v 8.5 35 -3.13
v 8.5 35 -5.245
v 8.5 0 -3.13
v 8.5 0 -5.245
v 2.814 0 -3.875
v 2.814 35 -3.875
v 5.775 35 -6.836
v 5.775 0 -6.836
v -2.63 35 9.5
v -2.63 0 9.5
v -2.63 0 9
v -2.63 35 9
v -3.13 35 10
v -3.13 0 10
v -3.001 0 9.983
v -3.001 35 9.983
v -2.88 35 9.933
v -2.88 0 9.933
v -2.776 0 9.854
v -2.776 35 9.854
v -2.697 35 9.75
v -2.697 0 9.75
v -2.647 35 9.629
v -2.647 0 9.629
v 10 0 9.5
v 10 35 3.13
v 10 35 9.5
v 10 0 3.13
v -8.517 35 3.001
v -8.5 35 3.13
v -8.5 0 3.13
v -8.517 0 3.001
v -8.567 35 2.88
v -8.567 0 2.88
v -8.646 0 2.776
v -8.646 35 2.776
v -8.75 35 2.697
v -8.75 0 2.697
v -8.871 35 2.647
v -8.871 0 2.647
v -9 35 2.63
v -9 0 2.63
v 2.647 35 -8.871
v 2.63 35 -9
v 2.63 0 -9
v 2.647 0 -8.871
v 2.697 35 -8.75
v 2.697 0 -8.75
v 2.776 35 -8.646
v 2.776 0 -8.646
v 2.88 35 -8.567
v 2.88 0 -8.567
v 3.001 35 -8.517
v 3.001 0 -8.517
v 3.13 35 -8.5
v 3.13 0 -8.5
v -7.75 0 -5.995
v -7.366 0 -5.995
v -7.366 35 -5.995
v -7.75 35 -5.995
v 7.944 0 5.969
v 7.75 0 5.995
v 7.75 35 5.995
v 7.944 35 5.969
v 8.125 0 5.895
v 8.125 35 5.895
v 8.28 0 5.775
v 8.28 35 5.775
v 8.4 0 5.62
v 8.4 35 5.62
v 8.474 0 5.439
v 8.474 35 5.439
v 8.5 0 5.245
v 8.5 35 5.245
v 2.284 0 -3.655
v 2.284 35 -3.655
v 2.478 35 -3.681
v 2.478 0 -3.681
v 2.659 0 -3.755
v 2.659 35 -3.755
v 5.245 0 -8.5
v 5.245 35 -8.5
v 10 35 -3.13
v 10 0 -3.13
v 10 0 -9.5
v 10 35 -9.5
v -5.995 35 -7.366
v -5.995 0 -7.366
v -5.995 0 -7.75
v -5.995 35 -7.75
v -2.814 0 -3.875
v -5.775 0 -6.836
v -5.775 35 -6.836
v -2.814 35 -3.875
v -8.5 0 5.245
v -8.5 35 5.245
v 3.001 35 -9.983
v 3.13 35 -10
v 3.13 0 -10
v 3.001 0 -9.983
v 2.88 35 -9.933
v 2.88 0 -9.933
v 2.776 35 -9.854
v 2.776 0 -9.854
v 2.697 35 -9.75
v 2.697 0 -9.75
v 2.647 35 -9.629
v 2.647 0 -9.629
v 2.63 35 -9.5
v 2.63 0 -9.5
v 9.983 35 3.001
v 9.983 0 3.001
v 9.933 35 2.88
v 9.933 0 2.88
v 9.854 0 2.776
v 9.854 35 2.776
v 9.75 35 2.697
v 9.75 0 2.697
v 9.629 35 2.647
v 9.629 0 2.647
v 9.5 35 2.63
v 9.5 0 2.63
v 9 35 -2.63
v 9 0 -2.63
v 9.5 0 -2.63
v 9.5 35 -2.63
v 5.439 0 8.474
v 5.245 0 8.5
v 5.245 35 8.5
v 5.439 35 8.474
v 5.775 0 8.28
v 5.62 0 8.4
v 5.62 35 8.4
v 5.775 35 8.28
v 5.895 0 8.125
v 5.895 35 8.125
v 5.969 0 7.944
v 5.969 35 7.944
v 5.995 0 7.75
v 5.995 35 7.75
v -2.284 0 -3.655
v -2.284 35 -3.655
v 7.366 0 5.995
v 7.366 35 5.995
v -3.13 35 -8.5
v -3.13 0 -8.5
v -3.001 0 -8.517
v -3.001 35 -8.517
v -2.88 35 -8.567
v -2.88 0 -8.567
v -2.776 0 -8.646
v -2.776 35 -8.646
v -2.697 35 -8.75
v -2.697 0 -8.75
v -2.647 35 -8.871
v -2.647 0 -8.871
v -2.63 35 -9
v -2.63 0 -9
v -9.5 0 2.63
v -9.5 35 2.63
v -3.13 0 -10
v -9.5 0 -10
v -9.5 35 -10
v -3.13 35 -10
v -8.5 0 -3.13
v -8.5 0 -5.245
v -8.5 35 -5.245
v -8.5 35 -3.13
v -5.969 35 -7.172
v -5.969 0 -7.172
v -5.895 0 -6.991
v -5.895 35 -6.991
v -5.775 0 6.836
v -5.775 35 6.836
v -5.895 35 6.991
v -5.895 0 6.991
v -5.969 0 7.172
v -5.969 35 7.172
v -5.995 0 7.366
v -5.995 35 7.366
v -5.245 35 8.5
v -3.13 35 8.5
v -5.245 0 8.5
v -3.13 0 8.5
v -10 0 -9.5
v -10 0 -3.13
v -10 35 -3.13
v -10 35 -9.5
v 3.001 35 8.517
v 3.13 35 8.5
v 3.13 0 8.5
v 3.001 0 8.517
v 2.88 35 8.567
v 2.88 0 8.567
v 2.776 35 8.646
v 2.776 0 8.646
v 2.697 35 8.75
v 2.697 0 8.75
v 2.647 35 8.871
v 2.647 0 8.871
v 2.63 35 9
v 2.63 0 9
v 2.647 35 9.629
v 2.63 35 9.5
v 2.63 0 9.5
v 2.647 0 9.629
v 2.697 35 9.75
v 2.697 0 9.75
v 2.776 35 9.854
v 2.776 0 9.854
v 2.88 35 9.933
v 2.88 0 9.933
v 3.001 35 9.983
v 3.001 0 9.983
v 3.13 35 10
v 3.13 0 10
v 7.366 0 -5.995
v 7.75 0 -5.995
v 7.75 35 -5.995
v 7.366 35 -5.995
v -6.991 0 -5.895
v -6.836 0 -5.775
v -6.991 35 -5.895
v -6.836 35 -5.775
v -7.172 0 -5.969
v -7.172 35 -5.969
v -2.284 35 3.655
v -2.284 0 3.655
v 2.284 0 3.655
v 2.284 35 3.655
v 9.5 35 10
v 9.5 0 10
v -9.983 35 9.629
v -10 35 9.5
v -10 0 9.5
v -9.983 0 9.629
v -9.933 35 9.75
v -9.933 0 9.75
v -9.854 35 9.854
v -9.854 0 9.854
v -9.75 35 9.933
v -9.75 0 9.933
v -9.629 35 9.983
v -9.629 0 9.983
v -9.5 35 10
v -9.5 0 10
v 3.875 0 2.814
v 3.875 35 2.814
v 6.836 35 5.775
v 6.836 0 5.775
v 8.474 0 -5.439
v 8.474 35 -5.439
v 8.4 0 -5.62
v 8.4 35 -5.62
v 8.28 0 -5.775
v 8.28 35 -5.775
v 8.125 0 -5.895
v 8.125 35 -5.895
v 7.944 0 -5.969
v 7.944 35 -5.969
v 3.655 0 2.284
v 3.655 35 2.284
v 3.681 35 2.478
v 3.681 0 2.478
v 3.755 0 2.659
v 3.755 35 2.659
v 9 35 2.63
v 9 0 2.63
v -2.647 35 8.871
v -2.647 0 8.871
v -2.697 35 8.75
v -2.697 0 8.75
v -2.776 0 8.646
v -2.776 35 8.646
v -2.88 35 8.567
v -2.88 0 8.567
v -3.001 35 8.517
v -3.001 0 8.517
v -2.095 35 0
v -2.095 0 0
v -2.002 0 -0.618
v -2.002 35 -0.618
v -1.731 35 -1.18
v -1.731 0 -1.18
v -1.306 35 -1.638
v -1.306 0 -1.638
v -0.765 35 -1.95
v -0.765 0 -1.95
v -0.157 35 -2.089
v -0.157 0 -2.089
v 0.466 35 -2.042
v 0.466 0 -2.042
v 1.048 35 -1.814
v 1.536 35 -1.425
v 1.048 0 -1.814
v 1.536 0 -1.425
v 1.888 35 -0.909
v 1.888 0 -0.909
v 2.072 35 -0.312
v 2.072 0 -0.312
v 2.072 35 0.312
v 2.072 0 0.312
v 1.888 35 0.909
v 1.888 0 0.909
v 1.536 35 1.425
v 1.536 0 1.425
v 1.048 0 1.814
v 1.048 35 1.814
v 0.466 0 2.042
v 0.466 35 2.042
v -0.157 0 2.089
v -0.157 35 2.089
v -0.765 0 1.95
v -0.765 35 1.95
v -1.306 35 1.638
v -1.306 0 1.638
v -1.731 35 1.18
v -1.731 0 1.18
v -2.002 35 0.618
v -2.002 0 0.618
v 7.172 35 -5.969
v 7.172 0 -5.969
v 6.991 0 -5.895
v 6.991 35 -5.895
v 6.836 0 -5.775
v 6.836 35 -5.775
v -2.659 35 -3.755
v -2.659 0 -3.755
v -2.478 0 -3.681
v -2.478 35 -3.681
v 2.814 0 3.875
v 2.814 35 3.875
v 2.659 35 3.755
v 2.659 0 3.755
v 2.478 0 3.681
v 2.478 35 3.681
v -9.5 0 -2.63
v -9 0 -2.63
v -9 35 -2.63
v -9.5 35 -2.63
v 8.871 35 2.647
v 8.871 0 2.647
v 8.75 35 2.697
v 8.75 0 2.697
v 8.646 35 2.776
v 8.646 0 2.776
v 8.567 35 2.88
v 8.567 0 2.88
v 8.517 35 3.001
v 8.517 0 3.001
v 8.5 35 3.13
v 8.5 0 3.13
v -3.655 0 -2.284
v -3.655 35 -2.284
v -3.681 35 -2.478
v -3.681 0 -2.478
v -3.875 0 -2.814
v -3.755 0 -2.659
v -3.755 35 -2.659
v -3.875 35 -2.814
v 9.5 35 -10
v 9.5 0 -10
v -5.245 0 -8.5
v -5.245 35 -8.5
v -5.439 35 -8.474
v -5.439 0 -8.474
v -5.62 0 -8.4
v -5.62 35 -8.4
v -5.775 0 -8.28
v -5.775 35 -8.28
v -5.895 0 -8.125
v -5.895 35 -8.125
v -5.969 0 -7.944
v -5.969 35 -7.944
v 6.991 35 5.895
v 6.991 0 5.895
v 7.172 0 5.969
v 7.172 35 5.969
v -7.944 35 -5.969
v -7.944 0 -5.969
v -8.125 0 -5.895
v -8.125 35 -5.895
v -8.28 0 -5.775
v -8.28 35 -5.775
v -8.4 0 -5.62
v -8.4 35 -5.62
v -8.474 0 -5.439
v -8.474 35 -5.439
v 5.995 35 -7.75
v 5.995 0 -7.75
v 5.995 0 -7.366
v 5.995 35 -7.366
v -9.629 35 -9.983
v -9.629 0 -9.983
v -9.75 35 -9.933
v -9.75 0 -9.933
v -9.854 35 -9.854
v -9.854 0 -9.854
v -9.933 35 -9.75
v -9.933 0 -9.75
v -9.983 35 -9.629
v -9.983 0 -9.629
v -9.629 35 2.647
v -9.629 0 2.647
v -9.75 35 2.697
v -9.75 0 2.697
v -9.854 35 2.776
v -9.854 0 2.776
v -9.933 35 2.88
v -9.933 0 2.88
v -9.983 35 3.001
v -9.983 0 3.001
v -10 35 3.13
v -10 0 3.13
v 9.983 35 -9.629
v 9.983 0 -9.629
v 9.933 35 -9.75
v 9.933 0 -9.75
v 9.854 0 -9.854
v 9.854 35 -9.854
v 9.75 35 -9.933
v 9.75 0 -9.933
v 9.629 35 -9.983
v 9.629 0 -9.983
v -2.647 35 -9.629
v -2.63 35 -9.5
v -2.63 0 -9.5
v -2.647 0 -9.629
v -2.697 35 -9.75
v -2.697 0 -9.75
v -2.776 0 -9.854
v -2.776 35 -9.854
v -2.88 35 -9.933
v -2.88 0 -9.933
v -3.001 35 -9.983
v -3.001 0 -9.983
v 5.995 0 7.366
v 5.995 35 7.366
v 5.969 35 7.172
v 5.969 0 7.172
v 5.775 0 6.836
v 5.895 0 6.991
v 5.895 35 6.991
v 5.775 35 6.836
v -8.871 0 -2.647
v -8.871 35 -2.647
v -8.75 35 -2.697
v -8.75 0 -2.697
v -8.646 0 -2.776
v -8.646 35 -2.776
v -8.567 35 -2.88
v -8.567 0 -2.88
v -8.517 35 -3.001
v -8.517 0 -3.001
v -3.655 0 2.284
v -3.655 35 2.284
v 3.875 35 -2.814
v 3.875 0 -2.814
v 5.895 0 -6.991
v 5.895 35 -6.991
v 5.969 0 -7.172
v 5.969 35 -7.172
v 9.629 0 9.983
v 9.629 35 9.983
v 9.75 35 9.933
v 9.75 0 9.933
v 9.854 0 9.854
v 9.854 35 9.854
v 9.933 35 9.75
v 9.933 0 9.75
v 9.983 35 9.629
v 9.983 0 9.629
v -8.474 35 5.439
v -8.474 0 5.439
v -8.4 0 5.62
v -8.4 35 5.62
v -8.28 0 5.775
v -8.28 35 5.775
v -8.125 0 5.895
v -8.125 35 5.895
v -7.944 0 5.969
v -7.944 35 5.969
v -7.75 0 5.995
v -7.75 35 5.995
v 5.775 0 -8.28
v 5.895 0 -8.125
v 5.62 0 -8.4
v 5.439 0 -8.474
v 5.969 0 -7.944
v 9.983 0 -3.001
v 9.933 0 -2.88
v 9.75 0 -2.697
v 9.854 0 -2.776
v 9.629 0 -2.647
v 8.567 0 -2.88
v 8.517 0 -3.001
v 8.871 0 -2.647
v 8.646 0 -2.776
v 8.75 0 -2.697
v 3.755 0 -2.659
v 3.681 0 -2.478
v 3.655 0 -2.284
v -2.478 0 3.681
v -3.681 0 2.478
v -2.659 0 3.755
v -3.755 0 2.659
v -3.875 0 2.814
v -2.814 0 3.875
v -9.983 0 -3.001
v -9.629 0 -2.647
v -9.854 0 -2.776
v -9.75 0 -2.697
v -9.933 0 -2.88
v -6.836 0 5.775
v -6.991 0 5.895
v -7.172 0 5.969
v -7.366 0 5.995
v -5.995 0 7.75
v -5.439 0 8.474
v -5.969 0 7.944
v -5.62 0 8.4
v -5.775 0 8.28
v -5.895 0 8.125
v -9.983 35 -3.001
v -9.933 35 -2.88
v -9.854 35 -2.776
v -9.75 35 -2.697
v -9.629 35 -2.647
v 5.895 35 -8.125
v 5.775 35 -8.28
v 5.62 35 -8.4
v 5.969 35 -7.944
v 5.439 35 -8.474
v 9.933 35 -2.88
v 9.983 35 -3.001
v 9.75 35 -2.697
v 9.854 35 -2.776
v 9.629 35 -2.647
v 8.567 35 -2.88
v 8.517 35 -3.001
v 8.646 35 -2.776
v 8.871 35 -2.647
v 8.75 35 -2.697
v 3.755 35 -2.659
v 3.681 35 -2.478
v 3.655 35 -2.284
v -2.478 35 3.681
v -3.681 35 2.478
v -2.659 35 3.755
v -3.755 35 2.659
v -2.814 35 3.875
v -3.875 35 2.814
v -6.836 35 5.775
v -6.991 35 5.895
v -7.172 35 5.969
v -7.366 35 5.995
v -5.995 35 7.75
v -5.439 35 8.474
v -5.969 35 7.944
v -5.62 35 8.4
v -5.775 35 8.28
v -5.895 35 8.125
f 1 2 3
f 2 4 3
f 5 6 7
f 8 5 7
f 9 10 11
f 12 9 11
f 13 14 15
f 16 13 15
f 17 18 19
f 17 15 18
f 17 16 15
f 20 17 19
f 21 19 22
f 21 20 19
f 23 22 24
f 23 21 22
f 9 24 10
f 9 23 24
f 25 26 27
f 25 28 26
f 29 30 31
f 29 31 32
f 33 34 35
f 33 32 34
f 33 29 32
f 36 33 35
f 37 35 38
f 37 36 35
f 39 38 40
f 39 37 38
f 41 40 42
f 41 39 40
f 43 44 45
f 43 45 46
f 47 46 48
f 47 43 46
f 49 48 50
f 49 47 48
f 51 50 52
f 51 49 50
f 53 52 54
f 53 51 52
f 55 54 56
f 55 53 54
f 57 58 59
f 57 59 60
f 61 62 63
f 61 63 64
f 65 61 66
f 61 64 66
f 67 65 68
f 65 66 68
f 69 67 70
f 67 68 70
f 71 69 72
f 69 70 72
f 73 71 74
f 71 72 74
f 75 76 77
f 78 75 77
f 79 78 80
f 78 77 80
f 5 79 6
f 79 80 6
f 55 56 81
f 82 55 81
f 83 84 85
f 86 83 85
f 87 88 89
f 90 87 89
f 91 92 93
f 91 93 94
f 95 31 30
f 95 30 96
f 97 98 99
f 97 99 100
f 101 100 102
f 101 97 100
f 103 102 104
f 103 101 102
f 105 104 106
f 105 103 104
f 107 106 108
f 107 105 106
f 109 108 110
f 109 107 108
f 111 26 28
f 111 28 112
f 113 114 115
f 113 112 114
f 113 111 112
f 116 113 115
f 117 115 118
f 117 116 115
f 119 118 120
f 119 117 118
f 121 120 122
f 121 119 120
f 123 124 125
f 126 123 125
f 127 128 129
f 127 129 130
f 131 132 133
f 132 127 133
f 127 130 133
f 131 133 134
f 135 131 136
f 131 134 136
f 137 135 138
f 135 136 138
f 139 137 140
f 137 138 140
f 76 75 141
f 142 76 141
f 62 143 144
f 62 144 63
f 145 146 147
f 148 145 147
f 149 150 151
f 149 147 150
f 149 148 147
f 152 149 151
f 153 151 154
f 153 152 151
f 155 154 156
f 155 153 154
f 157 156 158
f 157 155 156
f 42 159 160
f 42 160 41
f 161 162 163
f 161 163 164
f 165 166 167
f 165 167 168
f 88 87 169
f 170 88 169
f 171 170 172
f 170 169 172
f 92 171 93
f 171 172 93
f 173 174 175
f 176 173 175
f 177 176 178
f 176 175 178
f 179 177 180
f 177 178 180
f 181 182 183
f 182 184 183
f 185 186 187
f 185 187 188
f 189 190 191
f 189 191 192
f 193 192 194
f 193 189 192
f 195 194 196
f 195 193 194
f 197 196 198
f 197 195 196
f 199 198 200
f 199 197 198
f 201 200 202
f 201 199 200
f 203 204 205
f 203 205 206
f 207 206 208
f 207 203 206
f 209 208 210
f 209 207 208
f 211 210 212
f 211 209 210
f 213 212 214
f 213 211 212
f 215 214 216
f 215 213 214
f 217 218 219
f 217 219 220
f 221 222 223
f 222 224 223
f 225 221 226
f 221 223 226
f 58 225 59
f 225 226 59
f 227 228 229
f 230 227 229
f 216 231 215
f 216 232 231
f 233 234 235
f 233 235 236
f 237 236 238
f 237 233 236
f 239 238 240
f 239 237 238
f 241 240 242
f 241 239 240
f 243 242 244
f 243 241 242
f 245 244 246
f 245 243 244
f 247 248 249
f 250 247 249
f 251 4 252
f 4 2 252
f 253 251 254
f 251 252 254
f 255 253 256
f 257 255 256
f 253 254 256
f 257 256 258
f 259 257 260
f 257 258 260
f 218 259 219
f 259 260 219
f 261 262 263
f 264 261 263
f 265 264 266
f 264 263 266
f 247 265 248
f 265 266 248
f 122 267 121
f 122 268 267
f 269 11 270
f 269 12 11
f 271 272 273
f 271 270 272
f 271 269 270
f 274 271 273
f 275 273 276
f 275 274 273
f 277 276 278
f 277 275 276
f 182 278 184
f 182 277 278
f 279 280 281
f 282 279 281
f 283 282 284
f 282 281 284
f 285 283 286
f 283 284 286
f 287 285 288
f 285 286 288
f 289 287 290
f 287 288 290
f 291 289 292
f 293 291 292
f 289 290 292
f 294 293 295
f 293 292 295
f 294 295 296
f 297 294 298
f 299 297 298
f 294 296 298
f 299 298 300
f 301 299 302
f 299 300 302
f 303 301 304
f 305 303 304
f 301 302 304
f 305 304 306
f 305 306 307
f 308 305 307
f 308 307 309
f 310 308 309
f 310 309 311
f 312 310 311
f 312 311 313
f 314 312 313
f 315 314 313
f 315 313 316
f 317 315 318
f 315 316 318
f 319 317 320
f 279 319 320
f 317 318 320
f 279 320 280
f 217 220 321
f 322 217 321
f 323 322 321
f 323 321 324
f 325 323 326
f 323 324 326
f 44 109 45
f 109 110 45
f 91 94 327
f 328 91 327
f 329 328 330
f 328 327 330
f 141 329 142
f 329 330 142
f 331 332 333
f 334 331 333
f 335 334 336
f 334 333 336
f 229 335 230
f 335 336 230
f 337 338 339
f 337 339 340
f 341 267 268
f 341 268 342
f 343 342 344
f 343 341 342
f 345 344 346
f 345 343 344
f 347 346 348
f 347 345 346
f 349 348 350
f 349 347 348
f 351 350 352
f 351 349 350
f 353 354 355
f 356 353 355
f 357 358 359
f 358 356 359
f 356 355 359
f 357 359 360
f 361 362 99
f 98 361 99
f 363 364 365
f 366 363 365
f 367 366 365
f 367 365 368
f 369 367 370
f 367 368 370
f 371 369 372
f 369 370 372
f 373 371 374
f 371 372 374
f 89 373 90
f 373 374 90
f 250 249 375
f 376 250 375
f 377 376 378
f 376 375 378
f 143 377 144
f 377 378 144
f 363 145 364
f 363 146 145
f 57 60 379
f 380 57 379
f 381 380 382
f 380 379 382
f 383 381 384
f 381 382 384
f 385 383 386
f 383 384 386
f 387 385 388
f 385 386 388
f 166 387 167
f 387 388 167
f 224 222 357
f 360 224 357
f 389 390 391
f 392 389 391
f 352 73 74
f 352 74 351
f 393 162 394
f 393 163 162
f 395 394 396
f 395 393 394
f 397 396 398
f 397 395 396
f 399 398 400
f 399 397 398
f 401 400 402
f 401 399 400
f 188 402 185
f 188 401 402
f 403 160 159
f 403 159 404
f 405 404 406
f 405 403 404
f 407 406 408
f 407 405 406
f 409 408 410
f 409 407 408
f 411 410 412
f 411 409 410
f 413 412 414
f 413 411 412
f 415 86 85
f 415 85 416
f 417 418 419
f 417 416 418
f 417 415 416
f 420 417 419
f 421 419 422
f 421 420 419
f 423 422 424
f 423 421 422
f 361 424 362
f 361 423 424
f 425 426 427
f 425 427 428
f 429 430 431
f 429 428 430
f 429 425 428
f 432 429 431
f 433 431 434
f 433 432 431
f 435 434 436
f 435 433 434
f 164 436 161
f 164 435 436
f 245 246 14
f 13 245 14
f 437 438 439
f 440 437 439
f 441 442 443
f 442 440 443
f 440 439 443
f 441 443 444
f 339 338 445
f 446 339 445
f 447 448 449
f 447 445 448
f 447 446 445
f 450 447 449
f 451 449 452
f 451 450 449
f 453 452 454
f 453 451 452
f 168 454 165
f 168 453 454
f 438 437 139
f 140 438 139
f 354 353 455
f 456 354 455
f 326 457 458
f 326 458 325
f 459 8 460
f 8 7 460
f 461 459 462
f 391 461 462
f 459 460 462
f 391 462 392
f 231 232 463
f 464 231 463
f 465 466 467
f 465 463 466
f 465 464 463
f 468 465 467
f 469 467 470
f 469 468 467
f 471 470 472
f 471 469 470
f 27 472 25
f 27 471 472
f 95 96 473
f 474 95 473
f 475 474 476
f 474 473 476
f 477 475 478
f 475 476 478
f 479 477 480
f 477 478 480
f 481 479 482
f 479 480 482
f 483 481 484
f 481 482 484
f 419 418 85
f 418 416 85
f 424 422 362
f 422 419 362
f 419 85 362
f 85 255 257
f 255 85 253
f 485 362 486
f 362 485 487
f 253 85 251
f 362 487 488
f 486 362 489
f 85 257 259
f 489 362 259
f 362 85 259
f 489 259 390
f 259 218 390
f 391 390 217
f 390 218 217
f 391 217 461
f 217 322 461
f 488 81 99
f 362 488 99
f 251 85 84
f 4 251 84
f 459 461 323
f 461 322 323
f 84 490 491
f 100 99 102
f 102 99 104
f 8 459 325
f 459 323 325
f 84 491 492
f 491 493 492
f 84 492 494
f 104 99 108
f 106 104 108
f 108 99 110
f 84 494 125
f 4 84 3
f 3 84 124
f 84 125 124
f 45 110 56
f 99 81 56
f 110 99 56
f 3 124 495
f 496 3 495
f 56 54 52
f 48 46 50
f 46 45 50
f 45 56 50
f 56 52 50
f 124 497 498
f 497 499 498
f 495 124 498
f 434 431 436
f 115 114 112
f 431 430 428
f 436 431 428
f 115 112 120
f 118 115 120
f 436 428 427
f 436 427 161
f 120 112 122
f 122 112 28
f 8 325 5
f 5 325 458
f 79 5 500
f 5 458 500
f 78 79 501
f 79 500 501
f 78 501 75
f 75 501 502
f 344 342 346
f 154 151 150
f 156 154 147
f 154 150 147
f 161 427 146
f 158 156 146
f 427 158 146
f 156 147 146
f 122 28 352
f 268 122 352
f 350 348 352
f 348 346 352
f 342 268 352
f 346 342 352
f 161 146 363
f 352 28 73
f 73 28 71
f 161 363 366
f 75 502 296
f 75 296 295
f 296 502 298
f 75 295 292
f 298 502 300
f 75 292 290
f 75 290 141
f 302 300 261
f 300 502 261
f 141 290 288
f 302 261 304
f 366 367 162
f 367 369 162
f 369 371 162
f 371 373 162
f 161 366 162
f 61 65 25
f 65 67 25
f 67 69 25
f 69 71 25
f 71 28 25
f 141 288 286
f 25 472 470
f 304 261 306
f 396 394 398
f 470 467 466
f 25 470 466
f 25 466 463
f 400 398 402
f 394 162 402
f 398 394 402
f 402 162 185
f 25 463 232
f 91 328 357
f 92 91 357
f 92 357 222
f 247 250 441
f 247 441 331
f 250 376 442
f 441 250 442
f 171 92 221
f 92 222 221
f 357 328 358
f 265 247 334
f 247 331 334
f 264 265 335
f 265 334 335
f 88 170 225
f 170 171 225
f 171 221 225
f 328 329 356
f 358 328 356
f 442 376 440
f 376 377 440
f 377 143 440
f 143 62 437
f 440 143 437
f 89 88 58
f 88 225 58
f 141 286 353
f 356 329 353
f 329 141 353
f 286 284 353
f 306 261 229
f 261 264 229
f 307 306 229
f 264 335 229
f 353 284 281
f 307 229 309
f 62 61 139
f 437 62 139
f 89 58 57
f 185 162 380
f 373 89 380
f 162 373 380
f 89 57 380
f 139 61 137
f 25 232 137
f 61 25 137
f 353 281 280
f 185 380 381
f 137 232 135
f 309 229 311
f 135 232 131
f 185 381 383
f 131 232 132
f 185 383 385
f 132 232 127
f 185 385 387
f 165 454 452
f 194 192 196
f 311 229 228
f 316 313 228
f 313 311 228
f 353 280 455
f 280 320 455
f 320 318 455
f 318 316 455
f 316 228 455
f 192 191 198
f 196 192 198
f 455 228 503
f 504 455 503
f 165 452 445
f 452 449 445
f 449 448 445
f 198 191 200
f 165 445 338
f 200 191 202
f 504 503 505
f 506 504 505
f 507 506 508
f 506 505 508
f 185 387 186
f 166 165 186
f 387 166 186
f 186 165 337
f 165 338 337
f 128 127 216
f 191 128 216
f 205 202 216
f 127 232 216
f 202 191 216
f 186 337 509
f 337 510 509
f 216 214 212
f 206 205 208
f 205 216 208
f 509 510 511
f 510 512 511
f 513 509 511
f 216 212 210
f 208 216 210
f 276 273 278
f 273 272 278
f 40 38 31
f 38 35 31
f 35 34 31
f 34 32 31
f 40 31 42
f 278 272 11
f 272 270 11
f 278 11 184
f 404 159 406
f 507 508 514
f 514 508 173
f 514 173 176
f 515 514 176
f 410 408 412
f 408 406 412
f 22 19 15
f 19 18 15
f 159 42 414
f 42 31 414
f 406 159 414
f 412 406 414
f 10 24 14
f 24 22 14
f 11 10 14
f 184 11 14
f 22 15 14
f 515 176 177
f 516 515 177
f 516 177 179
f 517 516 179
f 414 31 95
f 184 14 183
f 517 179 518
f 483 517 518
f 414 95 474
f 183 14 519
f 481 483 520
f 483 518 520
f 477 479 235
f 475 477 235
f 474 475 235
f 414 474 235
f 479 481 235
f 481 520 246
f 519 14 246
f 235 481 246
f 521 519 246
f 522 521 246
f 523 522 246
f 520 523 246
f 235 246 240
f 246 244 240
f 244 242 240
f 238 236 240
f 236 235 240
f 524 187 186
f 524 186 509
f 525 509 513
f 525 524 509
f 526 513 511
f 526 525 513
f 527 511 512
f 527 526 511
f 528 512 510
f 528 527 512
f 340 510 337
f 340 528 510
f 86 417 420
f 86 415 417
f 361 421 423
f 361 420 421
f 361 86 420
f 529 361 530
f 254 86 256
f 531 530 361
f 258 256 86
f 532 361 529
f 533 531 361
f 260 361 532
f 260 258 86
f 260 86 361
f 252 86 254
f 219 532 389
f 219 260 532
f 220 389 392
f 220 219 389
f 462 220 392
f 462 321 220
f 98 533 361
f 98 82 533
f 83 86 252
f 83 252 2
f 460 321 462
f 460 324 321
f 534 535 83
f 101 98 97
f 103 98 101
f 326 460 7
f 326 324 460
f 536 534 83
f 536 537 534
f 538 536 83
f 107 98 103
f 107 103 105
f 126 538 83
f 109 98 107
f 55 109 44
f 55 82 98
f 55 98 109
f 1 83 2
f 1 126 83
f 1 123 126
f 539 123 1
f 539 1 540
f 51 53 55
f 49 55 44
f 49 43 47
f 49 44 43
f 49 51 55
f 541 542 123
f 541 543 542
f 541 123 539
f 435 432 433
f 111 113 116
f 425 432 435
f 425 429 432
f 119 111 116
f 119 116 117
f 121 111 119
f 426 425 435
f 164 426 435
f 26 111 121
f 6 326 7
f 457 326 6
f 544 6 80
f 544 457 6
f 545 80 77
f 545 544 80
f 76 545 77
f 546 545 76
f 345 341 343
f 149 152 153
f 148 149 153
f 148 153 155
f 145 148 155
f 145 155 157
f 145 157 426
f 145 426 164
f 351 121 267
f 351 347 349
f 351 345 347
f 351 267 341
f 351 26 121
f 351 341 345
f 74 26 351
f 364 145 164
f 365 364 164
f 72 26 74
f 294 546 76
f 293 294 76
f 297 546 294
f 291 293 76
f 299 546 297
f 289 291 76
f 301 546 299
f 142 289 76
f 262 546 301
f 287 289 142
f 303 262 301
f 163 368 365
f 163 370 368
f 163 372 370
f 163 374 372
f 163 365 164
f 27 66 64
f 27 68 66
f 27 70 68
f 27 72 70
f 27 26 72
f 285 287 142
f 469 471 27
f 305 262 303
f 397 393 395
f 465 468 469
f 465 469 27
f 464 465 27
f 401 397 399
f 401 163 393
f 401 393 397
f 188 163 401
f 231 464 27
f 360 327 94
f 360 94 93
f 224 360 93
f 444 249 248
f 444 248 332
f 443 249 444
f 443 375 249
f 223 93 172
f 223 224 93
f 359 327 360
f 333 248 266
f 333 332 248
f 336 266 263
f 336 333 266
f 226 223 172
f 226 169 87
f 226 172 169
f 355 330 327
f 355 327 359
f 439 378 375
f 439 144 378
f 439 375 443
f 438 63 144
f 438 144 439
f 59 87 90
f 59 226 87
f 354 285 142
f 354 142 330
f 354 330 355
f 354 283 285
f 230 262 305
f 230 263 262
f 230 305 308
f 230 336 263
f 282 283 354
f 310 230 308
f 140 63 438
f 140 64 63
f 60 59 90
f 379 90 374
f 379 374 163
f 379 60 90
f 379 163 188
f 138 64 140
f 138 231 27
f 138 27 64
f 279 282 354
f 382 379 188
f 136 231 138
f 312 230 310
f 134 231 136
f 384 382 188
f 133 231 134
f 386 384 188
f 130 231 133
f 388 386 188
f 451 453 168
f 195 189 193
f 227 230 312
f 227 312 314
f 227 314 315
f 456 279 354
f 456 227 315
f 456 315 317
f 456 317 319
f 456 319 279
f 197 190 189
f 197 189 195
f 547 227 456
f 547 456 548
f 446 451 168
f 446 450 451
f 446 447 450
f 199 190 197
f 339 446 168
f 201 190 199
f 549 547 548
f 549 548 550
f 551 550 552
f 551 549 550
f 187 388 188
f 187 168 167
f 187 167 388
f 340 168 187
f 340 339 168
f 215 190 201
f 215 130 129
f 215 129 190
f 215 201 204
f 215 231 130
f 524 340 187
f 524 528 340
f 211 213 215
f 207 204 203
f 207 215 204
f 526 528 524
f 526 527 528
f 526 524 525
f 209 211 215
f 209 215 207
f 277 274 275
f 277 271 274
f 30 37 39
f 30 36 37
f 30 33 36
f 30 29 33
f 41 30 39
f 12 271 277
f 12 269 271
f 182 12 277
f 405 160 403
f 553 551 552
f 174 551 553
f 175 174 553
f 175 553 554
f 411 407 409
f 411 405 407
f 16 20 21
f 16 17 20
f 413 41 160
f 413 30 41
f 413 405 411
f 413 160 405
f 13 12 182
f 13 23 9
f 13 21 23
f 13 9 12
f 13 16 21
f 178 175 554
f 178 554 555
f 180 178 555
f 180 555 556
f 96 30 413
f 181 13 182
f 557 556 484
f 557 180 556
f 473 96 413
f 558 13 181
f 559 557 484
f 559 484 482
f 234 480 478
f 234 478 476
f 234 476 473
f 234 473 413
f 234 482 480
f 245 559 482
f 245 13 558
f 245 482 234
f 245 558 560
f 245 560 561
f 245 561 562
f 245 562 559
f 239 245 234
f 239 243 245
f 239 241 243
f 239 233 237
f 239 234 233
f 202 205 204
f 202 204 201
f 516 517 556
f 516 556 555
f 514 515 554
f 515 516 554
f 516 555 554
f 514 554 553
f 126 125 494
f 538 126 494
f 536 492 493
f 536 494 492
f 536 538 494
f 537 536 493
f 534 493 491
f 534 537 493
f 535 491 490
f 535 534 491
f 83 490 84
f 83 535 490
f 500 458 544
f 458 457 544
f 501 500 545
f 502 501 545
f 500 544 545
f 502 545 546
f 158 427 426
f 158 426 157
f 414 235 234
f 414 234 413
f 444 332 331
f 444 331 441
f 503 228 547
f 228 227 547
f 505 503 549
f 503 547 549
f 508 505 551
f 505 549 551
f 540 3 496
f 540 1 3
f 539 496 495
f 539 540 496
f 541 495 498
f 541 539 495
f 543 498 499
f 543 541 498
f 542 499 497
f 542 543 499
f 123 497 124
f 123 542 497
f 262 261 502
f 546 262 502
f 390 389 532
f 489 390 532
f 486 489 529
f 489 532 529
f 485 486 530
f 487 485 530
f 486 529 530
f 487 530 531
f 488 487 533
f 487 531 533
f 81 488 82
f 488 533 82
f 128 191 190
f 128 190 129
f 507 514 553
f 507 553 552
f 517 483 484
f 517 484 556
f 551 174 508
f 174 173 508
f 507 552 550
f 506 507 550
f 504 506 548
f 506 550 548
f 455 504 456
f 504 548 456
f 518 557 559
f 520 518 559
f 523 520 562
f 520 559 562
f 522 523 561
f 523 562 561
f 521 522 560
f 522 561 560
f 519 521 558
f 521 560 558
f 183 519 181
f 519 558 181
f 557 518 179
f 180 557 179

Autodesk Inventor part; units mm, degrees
ref_plane "YZ Plane" through (0, 0, 0) normal (1, 0, 0) x (0, 1, 0)
ref_plane "XZ Plane" through (0, 0, 0) normal (0, 1, 0) x (-1, 0, 0)
ref_plane "XY Plane" through (0, 0, 0) normal (0, 0, 1) x (1, 0, 0)
sketch "Sketch1" plane through (0, 0, 0) normal (0, 1, 0) x (-1, 0, 0)
  line L0 (0, -14) -> (0, 14) projected
  line L1 (-14, 0) -> (14, 0) projected
  line L2 (14, 0) -> (-14, 0) projected
  line L3 (0, -14) -> (0, 14) projected
  line L4 (2.5943, 3.655) -> (-2.5943, 3.655)
  line L5 (-3.655, 2.5943) -> (-3.655, -2.5943)
  line L6 (-2.5943, -3.655) -> (2.5943, -3.655)
  line L7 (3.655, -2.5943) -> (3.655, 2.5943)
  line L8 (-3.655, 3.655) -> (3.655, -3.655) construction
  line L9 (10, 10) -> (10, 2.63)
  line L10 (10, 2.63) -> (8.5, 2.63)
  line L11 (10, 10) -> (2.63, 10)
  line L12 (2.63, 10) -> (2.63, 8.5)
  line L13 (-10, 10) -> (-2.63, 10)
  line L14 (-2.63, 10) -> (-2.63, 8.5)
  line L15 (-10, 8.5) -> (-10, 10)
  line L16 (-10, 10) -> (-8.5, 10)
  line L17 (-8.5, 2.63) -> (-10, 2.63)
  line L18 (-10, 2.63) -> (-10, 10)
  line L19 (-10, -10) -> (-8.5, -10)
  line L20 (-8.5, -2.63) -> (-10, -2.63)
  line L21 (-10, -2.63) -> (-10, -10)
  line L22 (-10, -10) -> (-2.63, -10)
  line L23 (-2.63, -10) -> (-2.63, -8.5)
  line L24 (-10, -8.5) -> (-10, -10)
  line L25 (10, -10) -> (8.5, -10)
  line L26 (8.5, -2.63) -> (10, -2.63)
  line L27 (10, -2.63) -> (10, -10)
  line L28 (10, -10) -> (2.63, -10)
  line L29 (2.63, -10) -> (2.63, -8.5)
  line L30 (10, -8.5) -> (10, -10)
  circle A0 centre (0, 0) radius 2.095
  line L31 (5.995, -10) -> (2.63, -10)
  line L32 (-2.63, -10) -> (-5.995, -10)
  line L33 (10, -10) -> (2.63, -10)
  line L34 (-2.63, -10) -> (-10, -10)
  line L35 (10, -5.995) -> (10, -2.63)
  line L36 (10, 2.63) -> (10, 5.995)
  line L37 (10, 10) -> (10, 2.63)
  line L38 (10, -2.63) -> (10, -10)
  line L39 (-5.995, 10) -> (-2.63, 10)
  line L40 (2.63, 10) -> (5.995, 10)
  line L41 (-10, 10) -> (-2.63, 10)
  line L42 (2.63, 10) -> (10, 10)
  line L43 (-10, 5.995) -> (-10, 2.63)
  line L44 (-10, -2.63) -> (-10, -5.995)
  line L45 (-10, -10) -> (-10, -2.63)
  line L46 (-10, 2.63) -> (-10, 10)
  line L47 (-2.63, -8.5) -> (-5.995, -8.5)
  line L48 (-8.5, -5.995) -> (-8.5, -2.63)
  line L49 (-8.5, -5.995) -> (-7.0557, -5.995)
  line L50 (-5.995, -8.5) -> (-5.995, -7.0557)
  line L51 (-5.995, 7.0557) -> (-5.995, 8.5)
  line L52 (2.63, 8.5) -> (5.995, 8.5)
  line L53 (8.5, 2.63) -> (8.5, 5.995)
  line L54 (8.5, 5.995) -> (7.0557, 5.995)
  line L55 (5.995, 8.5) -> (5.995, 7.0557)
  line L56 (2.63, -8.5) -> (5.995, -8.5)
  line L57 (9.5607, -8.5) -> (10, -8.5)
  line L58 (8.5, -10) -> (8.5, -9.5607)
  line L59 (8.5, -5.995) -> (8.5, -2.63)
  line L60 (7.0557, -5.995) -> (8.5, -5.995)
  line L61 (5.995, -7.0557) -> (5.995, -8.5)
  line L62 (3.655, 3.655) -> (-0.5303, -0.5303) construction
  line L63 (-1.4814, -1.4814) -> (-3.655, -3.655) construction
  line L64 (-8.5, 10) -> (-8.5, 9.5607)
  line L65 (-8.5, 5.995) -> (-8.5, 2.63)
  line L66 (-2.63, 8.5) -> (-5.995, 8.5)
  line L67 (-9.5607, 8.5) -> (-10, 8.5)
  line L68 (-7.0557, 5.995) -> (-8.5, 5.995)
  line L69 (-3.655, 2.5943) -> (-7.0557, 5.995)
  line L70 (-2.5943, 3.655) -> (-5.995, 7.0557)
  line L71 (5.995, 7.0557) -> (2.5943, 3.655)
  line L72 (7.0557, 5.995) -> (3.655, 2.5943)
  line L73 (7.0557, -5.995) -> (3.655, -2.5943)
  line L74 (5.995, -7.0557) -> (2.5943, -3.655)
  line L75 (-2.5943, -3.655) -> (-5.995, -7.0557)
  line L76 (-3.655, -2.5943) -> (-7.0557, -5.995)
  dimension "d26" = 4.19
  dimension "d0" = 20
  dimension "d1" = 20
  dimension "d2" = 7.31
  dimension "d3" = 7.31
  dimension "d4" = 20
  dimension "d5" = 11.99
  dimension "d6" = 11.99
  dimension "d11" = 7.37
  dimension "d12" = 1.5
  dimension "d13" = 7.37
  dimension "d14" = 1.5
  dimension "d15" = 7.37
  dimension "d16" = 1.5
  dimension "d17" = 7.37
  dimension "d18" = 1.5
  dimension "d19" = 7.37
  dimension "d20" = 7.37
  dimension "d21" = 1.5
  dimension "d22" = 1.5
  dimension "d23" = 7.37
  dimension "d24" = 7.37
  dimension "d25" = 1.5
extrude "Extrusion1" add sketch "Sketch1" along normal blind 35 contours L6 L75 L50 L47 L23 L22 L19 L21 L20 L48 L49 L76 L5 L1 A0 L0 | L0 A0 L1 L7 L73 L60 L59 L26 L27 L25 L28 L29 L56 L61 L74 L6 | L1 L5 L69 L68 L65 L17 L18 L15 L13 L14 L66 L51 L70 L4 L0 A0 | A0 L0 L4 L71 L55 L52 L12 L11 L9 L10 L53 L54 L72 L7 L1
fillet "Fillet1" radius 0.5 20 edges at (10, 17.5, 10) (2.63, 17.5, 10) (-2.63, 17.5, 10) (-2.63, 17.5, 8.5) (10, 17.5, 2.63) (8.5, 17.5, 2.63) (10, 17.5, -2.63) (8.5, 17.5, -2.63) (10, 17.5, -10) (2.63, 17.5, -8.5) (-2.63, 17.5, -10) (-2.63, 17.5, -8.5) (2.63, 17.5, -10) (-10, 17.5, -10) (-8.5, 17.5, -2.63) (-10, 17.5, -2.63) (-8.5, 17.5, 2.63) (-10, 17.5, 2.63) (-10, 17.5, 10) (2.63, 17.5, 8.5)
fillet "Fillet2" radius 0.75 24 edges at (-7.0557, 17.5, 5.995) (-3.655, 17.5, 2.5943) (-8.5, 17.5, -5.995) (-7.0557, 17.5, -5.995) (-5.995, 17.5, -8.5) (3.655, 17.5, -2.5943) (7.0557, 17.5, -5.995) (-2.5943, 17.5, 3.655) (-5.995, 17.5, 7.0557) (3.655, 17.5, 2.5943) (7.0557, 17.5, 5.995) (8.5, 17.5, 5.995) (8.5, 17.5, -5.995) (2.5943, 17.5, 3.655) (5.995, 17.5, 7.0557) (5.995, 17.5, 8.5) (-5.995, 17.5, 8.5) (-8.5, 17.5, 5.995) (2.5943, 17.5, -3.655) (5.995, 17.5, -7.0557) (5.995, 17.5, -8.5) (-5.995, 17.5, -7.0557) (-2.5943, 17.5, -3.655) (-3.655, 17.5, -2.5943)
properties part number "pro35mm"
